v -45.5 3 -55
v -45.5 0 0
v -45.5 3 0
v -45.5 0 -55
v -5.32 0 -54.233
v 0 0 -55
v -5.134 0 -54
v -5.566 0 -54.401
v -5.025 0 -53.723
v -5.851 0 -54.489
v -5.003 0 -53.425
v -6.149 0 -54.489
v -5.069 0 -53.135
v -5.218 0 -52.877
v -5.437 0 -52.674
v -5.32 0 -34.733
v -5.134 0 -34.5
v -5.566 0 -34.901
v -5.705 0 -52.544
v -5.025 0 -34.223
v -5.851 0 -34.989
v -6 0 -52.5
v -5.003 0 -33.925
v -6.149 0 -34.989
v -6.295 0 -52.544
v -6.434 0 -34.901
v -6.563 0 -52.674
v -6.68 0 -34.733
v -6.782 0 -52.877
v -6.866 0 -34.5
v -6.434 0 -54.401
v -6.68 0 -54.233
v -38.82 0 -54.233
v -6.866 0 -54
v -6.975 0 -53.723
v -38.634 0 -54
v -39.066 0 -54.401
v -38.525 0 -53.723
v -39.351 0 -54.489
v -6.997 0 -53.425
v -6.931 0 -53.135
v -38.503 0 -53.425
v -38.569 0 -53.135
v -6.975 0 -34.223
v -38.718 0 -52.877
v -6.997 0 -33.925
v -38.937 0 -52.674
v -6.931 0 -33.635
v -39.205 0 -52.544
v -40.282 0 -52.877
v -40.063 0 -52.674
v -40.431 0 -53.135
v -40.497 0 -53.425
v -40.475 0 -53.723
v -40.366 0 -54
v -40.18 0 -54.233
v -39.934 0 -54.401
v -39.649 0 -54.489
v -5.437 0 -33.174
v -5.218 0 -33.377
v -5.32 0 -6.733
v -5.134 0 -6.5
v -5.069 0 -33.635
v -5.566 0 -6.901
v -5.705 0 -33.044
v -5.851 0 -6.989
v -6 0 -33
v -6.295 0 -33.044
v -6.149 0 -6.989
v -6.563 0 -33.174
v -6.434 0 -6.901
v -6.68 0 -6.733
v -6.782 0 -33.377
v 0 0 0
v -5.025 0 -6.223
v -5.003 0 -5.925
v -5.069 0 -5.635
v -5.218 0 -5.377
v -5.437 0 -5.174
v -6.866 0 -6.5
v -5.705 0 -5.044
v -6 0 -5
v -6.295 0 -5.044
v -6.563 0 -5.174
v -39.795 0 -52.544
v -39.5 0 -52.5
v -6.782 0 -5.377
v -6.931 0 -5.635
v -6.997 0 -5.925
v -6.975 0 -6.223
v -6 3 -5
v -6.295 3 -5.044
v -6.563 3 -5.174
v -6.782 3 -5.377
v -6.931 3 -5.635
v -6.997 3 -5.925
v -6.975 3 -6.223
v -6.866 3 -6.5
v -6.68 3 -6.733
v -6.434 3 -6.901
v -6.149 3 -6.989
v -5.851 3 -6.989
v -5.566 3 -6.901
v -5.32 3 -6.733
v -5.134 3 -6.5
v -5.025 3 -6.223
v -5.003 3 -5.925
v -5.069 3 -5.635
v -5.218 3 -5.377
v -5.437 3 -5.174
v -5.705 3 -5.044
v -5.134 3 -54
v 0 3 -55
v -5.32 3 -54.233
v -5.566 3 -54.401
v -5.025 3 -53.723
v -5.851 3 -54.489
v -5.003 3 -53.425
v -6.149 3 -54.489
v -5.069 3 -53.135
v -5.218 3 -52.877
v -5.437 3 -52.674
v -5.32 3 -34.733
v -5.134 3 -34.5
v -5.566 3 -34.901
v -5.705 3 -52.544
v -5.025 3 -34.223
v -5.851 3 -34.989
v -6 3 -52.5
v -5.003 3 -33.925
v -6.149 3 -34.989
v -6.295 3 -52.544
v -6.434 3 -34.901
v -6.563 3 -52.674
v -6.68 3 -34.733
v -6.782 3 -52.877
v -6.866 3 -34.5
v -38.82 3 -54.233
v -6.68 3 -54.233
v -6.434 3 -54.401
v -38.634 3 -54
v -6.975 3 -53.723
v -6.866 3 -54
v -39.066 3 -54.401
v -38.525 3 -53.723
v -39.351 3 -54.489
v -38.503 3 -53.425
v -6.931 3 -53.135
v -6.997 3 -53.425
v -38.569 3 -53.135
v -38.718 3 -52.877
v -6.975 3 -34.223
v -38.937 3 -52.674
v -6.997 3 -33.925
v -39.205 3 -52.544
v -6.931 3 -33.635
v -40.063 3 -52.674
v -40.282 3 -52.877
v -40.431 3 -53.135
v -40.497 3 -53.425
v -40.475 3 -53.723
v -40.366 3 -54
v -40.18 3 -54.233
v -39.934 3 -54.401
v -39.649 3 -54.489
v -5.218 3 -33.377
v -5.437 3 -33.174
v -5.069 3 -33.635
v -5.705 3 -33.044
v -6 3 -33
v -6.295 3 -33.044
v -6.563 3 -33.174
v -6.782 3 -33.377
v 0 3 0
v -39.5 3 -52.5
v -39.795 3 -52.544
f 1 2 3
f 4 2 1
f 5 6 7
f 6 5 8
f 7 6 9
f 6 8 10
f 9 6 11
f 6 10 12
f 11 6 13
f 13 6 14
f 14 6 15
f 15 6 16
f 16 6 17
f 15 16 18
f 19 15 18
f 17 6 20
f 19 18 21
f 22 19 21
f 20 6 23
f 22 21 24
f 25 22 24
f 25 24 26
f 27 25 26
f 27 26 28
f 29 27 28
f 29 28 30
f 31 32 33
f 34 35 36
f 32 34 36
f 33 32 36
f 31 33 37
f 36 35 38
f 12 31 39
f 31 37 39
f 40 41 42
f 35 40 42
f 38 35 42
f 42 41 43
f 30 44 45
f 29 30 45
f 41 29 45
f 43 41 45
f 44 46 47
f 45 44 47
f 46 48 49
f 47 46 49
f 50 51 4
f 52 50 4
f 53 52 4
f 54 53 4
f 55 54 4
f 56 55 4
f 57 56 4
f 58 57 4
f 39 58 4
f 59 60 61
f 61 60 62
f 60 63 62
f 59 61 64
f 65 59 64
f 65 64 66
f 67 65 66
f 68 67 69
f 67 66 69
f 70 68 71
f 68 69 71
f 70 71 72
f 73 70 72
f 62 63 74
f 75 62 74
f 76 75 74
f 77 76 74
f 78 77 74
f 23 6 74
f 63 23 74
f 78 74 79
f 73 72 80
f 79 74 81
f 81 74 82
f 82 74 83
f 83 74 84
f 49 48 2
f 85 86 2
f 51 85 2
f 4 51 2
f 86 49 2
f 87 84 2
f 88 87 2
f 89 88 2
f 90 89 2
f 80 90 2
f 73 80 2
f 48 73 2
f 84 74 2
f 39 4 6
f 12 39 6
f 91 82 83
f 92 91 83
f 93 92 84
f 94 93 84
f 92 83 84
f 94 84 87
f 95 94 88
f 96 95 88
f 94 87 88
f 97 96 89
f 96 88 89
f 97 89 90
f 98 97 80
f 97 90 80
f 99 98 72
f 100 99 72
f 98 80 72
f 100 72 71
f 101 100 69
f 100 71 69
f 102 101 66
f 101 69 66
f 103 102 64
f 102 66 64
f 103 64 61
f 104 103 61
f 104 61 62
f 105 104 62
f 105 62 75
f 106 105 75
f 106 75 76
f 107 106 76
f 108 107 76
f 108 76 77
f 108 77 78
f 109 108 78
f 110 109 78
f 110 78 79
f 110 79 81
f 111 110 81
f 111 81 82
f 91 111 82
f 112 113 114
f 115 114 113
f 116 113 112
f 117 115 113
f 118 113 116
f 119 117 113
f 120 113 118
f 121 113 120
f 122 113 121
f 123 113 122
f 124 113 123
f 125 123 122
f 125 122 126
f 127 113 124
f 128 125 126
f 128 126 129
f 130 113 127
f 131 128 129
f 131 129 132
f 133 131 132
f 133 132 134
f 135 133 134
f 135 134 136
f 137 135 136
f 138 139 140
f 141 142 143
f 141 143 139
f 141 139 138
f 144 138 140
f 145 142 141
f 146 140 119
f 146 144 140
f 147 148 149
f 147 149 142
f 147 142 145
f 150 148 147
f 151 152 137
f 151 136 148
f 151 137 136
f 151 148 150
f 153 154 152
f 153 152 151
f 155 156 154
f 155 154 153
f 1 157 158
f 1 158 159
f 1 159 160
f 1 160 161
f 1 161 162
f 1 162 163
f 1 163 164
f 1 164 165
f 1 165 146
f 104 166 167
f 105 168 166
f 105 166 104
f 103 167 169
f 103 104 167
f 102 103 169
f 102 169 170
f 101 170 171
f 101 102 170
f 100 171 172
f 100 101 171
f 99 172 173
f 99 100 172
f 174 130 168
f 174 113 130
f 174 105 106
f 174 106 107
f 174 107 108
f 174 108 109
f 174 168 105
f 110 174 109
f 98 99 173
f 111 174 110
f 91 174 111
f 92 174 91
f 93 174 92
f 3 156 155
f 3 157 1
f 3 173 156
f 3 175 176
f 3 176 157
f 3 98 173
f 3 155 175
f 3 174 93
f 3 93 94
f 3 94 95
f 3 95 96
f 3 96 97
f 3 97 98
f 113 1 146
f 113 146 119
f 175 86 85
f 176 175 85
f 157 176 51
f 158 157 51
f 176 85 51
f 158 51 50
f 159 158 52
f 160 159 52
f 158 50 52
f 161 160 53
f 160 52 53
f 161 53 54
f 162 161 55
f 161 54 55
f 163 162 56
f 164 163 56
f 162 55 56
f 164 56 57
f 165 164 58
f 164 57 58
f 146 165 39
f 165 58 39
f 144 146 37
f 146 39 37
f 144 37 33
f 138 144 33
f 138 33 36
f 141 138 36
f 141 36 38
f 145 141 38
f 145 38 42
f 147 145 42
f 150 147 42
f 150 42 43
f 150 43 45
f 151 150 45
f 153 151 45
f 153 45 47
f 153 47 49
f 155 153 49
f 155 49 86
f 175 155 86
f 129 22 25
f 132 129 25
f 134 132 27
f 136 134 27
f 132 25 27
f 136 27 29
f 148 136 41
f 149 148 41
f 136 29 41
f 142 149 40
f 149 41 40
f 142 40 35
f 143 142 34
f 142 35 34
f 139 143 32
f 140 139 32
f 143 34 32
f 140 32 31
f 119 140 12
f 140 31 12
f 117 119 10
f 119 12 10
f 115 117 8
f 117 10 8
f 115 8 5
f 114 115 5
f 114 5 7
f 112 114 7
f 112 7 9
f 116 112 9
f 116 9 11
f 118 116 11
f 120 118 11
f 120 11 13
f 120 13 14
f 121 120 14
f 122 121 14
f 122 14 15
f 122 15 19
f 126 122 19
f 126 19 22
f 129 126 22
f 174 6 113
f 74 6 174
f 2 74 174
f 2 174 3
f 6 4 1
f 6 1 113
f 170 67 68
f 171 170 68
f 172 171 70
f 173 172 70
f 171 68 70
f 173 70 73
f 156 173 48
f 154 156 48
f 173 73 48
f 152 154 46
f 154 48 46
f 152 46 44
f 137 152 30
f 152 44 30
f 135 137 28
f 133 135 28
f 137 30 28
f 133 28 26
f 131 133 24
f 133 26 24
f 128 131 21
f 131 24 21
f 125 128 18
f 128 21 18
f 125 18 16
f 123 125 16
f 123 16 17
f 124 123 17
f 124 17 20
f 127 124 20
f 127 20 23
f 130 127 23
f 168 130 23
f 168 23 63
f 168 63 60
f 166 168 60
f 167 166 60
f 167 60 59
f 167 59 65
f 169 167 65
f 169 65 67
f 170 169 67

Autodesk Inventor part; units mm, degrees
ref_plane "YZ Plane" through (0, 0, 0) normal (1, 0, 0) x (0, 1, 0)
ref_plane "XZ Plane" through (0, 0, 0) normal (0, 1, 0) x (-1, 0, 0)
ref_plane "XY Plane" through (0, 0, 0) normal (0, 0, 1) x (1, 0, 0)
sketch "Sketch1" plane through (0, 0, 0) normal (0, 1, 0) x (-1, 0, 0)
  line L0 (0, 0) -> (45.5, 0)
  line L1 (45.5, 0) -> (45.5, -55)
  line L2 (45.5, -55) -> (0, -55)
  line L3 (0, -55) -> (0, 0)
  dimension "d0" = 45.5
  dimension "d1" = 55
extrude "Extrusion1" add sketch "Sketch1" along normal blind 3
sketch "Sketch2" plane through (0, 3, 0) normal (0, 1, 0) x (1, 0, 0)
  line L0 (-45.5, 55) -> (-45.5, 0) projected
  line L1 (-45.5, 40) -> (0, 40)
  line L2 (0, 0) -> (0, 55) projected
  line L3 (0, 55) -> (-45.5, 55) projected
  circle A0 centre (-6, 34) radius 1
  circle A1 centre (-6, 6) radius 1
  line L4 (-45.5, 0) -> (0, 0) projected
  line L5 (0, 55) -> (-45.5, 55)
  line L6 (-45.5, 55) -> (-45.5, 52)
  line L7 (-45.5, 52) -> (0, 52)
  line L8 (0, 52) -> (0, 55)
  circle A2 centre (-6, 53.5) radius 0.5
  line L9 (-22.75, 55) -> (-22.75, 53.5)
  circle A3 centre (-39.5, 53.5) radius 0.5
  dimension "d4" = 15
  dimension "d5" = 2
  dimension "d6" = 6
  dimension "d7" = 6
  dimension "d8" = 2
  dimension "d9" = 6
  dimension "d10" = 6
  dimension "d18" = 3
  dimension "d19" = 1
  dimension "d20" = 6
hole "Hole1" at (-6, 3, -6) at (-6, 3, -34) at (-6, 3, -53.5) at (-39.5, 3, -53.5) direction (0, -1, 0) diameter 2 end through all
sketch "Sketch3" plane through (0, 3, 0) normal (0, 1, 0) x (1, 0, 0)
  point P0 (0, 0)
properties part number "SideSupport" material "Wood (Birch)"
